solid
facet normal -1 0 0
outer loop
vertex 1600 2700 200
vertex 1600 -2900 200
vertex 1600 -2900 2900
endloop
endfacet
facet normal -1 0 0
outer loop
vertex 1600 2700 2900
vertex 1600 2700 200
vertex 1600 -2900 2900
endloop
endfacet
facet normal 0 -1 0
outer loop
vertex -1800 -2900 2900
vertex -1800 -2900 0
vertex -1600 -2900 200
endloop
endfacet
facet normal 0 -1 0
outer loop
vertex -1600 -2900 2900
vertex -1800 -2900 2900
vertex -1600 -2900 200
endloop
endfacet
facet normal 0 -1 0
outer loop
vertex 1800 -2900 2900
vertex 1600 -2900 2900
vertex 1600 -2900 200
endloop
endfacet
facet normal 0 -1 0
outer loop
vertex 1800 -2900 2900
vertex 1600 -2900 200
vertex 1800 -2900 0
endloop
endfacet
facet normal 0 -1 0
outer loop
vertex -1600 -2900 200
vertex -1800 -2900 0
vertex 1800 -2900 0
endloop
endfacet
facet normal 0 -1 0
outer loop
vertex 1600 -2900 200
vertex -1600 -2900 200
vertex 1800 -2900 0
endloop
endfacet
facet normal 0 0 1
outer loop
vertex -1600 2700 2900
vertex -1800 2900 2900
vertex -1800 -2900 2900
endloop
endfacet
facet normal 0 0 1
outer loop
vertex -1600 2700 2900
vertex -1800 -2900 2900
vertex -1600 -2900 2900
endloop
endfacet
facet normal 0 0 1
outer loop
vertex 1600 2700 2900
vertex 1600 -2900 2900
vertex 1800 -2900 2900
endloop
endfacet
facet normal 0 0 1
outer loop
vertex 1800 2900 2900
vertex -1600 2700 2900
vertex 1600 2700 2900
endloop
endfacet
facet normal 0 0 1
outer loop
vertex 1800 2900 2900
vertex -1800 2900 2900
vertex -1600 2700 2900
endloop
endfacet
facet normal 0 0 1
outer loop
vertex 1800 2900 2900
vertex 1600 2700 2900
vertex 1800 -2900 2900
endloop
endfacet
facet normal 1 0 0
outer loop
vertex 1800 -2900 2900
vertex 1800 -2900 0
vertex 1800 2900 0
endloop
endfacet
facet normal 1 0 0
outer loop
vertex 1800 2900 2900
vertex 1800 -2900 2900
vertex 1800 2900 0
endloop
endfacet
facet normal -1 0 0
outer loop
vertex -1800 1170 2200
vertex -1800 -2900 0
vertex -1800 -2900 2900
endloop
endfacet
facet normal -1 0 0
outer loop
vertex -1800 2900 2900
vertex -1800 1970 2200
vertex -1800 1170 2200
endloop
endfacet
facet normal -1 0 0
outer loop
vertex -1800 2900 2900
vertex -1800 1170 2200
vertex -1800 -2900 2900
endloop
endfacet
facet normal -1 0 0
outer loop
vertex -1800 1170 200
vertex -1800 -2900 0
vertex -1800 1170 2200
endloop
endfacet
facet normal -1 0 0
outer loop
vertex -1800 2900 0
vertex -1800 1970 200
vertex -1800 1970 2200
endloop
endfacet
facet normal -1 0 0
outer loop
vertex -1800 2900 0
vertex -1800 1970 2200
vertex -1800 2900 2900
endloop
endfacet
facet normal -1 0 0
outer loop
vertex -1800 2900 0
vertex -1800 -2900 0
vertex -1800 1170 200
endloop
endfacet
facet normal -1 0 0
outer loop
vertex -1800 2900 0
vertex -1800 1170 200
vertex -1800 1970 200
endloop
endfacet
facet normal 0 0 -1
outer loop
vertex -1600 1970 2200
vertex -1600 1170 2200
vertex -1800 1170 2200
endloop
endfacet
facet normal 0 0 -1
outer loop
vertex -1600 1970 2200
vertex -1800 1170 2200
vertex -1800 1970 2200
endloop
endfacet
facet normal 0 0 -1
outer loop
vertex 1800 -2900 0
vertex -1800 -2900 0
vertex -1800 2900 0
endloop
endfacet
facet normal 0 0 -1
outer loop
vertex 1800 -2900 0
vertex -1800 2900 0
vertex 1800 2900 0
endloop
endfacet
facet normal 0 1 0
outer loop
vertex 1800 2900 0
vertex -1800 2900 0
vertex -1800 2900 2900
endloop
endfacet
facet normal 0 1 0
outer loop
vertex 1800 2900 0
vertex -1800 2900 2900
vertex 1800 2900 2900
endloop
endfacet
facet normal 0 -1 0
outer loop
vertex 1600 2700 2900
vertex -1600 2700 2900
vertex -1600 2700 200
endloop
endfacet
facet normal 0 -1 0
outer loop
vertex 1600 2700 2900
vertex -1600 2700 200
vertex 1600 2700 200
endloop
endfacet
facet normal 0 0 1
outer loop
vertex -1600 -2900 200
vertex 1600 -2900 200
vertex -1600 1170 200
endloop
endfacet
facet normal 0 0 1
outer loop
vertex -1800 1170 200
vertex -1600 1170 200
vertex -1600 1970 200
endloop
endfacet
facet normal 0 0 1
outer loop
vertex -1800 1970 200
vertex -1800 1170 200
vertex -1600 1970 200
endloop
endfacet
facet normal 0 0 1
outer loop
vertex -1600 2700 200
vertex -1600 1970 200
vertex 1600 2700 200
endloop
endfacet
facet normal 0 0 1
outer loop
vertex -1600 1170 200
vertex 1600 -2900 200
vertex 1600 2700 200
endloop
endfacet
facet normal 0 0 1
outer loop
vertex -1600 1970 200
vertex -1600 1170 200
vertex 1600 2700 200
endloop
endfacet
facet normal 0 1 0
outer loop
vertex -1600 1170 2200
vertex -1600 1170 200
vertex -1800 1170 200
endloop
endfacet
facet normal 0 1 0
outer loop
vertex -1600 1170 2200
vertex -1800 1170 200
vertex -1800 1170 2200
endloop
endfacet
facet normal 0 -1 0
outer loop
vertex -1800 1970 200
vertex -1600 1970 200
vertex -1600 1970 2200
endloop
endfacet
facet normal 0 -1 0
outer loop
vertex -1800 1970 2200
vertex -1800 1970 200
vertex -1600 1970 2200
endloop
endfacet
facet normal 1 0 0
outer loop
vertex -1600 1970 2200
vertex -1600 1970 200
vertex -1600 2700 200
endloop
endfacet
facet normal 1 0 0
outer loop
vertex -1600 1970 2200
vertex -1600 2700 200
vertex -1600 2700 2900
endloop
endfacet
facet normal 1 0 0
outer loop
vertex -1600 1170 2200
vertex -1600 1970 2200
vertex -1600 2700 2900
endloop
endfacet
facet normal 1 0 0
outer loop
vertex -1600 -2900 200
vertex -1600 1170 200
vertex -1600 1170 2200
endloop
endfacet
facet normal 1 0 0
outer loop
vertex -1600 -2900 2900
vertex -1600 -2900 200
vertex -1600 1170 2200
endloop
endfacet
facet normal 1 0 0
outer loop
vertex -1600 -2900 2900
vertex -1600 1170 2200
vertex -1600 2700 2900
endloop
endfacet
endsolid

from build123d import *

# Parameters (mm, degrees)
F0_W     = 3600
F0_H     = 5800
F1_DEPTH = 2900
F2_W     = 3200
F2_H     = 2700
F3_DEPTH = 5600
F4_W     = 800
F4_H     = 2000
F5_DEPTH = 200


with BuildPart() as f1:
    # F0 (on Top) → F1 (new body)
    with BuildSketch(Plane.XY):
        Rectangle(F0_W, F0_H)
    extrude(amount=F1_DEPTH)

    # F2 (on face) → F3 (cut)
    with BuildSketch(Plane.XZ.offset(2900)):
        with Locations((0, 1550)):
            Rectangle(F2_W, F2_H)
    extrude(amount=-F3_DEPTH, mode=Mode.SUBTRACT)

    # F4 (on face) → F5 (cut, through all)
    with BuildSketch(Plane.YZ.offset(-1600)):
        with Locations((1570, 1200)):
            Rectangle(F4_W, F4_H)
    extrude(amount=-F5_DEPTH, mode=Mode.SUBTRACT)


solid = f1.part
